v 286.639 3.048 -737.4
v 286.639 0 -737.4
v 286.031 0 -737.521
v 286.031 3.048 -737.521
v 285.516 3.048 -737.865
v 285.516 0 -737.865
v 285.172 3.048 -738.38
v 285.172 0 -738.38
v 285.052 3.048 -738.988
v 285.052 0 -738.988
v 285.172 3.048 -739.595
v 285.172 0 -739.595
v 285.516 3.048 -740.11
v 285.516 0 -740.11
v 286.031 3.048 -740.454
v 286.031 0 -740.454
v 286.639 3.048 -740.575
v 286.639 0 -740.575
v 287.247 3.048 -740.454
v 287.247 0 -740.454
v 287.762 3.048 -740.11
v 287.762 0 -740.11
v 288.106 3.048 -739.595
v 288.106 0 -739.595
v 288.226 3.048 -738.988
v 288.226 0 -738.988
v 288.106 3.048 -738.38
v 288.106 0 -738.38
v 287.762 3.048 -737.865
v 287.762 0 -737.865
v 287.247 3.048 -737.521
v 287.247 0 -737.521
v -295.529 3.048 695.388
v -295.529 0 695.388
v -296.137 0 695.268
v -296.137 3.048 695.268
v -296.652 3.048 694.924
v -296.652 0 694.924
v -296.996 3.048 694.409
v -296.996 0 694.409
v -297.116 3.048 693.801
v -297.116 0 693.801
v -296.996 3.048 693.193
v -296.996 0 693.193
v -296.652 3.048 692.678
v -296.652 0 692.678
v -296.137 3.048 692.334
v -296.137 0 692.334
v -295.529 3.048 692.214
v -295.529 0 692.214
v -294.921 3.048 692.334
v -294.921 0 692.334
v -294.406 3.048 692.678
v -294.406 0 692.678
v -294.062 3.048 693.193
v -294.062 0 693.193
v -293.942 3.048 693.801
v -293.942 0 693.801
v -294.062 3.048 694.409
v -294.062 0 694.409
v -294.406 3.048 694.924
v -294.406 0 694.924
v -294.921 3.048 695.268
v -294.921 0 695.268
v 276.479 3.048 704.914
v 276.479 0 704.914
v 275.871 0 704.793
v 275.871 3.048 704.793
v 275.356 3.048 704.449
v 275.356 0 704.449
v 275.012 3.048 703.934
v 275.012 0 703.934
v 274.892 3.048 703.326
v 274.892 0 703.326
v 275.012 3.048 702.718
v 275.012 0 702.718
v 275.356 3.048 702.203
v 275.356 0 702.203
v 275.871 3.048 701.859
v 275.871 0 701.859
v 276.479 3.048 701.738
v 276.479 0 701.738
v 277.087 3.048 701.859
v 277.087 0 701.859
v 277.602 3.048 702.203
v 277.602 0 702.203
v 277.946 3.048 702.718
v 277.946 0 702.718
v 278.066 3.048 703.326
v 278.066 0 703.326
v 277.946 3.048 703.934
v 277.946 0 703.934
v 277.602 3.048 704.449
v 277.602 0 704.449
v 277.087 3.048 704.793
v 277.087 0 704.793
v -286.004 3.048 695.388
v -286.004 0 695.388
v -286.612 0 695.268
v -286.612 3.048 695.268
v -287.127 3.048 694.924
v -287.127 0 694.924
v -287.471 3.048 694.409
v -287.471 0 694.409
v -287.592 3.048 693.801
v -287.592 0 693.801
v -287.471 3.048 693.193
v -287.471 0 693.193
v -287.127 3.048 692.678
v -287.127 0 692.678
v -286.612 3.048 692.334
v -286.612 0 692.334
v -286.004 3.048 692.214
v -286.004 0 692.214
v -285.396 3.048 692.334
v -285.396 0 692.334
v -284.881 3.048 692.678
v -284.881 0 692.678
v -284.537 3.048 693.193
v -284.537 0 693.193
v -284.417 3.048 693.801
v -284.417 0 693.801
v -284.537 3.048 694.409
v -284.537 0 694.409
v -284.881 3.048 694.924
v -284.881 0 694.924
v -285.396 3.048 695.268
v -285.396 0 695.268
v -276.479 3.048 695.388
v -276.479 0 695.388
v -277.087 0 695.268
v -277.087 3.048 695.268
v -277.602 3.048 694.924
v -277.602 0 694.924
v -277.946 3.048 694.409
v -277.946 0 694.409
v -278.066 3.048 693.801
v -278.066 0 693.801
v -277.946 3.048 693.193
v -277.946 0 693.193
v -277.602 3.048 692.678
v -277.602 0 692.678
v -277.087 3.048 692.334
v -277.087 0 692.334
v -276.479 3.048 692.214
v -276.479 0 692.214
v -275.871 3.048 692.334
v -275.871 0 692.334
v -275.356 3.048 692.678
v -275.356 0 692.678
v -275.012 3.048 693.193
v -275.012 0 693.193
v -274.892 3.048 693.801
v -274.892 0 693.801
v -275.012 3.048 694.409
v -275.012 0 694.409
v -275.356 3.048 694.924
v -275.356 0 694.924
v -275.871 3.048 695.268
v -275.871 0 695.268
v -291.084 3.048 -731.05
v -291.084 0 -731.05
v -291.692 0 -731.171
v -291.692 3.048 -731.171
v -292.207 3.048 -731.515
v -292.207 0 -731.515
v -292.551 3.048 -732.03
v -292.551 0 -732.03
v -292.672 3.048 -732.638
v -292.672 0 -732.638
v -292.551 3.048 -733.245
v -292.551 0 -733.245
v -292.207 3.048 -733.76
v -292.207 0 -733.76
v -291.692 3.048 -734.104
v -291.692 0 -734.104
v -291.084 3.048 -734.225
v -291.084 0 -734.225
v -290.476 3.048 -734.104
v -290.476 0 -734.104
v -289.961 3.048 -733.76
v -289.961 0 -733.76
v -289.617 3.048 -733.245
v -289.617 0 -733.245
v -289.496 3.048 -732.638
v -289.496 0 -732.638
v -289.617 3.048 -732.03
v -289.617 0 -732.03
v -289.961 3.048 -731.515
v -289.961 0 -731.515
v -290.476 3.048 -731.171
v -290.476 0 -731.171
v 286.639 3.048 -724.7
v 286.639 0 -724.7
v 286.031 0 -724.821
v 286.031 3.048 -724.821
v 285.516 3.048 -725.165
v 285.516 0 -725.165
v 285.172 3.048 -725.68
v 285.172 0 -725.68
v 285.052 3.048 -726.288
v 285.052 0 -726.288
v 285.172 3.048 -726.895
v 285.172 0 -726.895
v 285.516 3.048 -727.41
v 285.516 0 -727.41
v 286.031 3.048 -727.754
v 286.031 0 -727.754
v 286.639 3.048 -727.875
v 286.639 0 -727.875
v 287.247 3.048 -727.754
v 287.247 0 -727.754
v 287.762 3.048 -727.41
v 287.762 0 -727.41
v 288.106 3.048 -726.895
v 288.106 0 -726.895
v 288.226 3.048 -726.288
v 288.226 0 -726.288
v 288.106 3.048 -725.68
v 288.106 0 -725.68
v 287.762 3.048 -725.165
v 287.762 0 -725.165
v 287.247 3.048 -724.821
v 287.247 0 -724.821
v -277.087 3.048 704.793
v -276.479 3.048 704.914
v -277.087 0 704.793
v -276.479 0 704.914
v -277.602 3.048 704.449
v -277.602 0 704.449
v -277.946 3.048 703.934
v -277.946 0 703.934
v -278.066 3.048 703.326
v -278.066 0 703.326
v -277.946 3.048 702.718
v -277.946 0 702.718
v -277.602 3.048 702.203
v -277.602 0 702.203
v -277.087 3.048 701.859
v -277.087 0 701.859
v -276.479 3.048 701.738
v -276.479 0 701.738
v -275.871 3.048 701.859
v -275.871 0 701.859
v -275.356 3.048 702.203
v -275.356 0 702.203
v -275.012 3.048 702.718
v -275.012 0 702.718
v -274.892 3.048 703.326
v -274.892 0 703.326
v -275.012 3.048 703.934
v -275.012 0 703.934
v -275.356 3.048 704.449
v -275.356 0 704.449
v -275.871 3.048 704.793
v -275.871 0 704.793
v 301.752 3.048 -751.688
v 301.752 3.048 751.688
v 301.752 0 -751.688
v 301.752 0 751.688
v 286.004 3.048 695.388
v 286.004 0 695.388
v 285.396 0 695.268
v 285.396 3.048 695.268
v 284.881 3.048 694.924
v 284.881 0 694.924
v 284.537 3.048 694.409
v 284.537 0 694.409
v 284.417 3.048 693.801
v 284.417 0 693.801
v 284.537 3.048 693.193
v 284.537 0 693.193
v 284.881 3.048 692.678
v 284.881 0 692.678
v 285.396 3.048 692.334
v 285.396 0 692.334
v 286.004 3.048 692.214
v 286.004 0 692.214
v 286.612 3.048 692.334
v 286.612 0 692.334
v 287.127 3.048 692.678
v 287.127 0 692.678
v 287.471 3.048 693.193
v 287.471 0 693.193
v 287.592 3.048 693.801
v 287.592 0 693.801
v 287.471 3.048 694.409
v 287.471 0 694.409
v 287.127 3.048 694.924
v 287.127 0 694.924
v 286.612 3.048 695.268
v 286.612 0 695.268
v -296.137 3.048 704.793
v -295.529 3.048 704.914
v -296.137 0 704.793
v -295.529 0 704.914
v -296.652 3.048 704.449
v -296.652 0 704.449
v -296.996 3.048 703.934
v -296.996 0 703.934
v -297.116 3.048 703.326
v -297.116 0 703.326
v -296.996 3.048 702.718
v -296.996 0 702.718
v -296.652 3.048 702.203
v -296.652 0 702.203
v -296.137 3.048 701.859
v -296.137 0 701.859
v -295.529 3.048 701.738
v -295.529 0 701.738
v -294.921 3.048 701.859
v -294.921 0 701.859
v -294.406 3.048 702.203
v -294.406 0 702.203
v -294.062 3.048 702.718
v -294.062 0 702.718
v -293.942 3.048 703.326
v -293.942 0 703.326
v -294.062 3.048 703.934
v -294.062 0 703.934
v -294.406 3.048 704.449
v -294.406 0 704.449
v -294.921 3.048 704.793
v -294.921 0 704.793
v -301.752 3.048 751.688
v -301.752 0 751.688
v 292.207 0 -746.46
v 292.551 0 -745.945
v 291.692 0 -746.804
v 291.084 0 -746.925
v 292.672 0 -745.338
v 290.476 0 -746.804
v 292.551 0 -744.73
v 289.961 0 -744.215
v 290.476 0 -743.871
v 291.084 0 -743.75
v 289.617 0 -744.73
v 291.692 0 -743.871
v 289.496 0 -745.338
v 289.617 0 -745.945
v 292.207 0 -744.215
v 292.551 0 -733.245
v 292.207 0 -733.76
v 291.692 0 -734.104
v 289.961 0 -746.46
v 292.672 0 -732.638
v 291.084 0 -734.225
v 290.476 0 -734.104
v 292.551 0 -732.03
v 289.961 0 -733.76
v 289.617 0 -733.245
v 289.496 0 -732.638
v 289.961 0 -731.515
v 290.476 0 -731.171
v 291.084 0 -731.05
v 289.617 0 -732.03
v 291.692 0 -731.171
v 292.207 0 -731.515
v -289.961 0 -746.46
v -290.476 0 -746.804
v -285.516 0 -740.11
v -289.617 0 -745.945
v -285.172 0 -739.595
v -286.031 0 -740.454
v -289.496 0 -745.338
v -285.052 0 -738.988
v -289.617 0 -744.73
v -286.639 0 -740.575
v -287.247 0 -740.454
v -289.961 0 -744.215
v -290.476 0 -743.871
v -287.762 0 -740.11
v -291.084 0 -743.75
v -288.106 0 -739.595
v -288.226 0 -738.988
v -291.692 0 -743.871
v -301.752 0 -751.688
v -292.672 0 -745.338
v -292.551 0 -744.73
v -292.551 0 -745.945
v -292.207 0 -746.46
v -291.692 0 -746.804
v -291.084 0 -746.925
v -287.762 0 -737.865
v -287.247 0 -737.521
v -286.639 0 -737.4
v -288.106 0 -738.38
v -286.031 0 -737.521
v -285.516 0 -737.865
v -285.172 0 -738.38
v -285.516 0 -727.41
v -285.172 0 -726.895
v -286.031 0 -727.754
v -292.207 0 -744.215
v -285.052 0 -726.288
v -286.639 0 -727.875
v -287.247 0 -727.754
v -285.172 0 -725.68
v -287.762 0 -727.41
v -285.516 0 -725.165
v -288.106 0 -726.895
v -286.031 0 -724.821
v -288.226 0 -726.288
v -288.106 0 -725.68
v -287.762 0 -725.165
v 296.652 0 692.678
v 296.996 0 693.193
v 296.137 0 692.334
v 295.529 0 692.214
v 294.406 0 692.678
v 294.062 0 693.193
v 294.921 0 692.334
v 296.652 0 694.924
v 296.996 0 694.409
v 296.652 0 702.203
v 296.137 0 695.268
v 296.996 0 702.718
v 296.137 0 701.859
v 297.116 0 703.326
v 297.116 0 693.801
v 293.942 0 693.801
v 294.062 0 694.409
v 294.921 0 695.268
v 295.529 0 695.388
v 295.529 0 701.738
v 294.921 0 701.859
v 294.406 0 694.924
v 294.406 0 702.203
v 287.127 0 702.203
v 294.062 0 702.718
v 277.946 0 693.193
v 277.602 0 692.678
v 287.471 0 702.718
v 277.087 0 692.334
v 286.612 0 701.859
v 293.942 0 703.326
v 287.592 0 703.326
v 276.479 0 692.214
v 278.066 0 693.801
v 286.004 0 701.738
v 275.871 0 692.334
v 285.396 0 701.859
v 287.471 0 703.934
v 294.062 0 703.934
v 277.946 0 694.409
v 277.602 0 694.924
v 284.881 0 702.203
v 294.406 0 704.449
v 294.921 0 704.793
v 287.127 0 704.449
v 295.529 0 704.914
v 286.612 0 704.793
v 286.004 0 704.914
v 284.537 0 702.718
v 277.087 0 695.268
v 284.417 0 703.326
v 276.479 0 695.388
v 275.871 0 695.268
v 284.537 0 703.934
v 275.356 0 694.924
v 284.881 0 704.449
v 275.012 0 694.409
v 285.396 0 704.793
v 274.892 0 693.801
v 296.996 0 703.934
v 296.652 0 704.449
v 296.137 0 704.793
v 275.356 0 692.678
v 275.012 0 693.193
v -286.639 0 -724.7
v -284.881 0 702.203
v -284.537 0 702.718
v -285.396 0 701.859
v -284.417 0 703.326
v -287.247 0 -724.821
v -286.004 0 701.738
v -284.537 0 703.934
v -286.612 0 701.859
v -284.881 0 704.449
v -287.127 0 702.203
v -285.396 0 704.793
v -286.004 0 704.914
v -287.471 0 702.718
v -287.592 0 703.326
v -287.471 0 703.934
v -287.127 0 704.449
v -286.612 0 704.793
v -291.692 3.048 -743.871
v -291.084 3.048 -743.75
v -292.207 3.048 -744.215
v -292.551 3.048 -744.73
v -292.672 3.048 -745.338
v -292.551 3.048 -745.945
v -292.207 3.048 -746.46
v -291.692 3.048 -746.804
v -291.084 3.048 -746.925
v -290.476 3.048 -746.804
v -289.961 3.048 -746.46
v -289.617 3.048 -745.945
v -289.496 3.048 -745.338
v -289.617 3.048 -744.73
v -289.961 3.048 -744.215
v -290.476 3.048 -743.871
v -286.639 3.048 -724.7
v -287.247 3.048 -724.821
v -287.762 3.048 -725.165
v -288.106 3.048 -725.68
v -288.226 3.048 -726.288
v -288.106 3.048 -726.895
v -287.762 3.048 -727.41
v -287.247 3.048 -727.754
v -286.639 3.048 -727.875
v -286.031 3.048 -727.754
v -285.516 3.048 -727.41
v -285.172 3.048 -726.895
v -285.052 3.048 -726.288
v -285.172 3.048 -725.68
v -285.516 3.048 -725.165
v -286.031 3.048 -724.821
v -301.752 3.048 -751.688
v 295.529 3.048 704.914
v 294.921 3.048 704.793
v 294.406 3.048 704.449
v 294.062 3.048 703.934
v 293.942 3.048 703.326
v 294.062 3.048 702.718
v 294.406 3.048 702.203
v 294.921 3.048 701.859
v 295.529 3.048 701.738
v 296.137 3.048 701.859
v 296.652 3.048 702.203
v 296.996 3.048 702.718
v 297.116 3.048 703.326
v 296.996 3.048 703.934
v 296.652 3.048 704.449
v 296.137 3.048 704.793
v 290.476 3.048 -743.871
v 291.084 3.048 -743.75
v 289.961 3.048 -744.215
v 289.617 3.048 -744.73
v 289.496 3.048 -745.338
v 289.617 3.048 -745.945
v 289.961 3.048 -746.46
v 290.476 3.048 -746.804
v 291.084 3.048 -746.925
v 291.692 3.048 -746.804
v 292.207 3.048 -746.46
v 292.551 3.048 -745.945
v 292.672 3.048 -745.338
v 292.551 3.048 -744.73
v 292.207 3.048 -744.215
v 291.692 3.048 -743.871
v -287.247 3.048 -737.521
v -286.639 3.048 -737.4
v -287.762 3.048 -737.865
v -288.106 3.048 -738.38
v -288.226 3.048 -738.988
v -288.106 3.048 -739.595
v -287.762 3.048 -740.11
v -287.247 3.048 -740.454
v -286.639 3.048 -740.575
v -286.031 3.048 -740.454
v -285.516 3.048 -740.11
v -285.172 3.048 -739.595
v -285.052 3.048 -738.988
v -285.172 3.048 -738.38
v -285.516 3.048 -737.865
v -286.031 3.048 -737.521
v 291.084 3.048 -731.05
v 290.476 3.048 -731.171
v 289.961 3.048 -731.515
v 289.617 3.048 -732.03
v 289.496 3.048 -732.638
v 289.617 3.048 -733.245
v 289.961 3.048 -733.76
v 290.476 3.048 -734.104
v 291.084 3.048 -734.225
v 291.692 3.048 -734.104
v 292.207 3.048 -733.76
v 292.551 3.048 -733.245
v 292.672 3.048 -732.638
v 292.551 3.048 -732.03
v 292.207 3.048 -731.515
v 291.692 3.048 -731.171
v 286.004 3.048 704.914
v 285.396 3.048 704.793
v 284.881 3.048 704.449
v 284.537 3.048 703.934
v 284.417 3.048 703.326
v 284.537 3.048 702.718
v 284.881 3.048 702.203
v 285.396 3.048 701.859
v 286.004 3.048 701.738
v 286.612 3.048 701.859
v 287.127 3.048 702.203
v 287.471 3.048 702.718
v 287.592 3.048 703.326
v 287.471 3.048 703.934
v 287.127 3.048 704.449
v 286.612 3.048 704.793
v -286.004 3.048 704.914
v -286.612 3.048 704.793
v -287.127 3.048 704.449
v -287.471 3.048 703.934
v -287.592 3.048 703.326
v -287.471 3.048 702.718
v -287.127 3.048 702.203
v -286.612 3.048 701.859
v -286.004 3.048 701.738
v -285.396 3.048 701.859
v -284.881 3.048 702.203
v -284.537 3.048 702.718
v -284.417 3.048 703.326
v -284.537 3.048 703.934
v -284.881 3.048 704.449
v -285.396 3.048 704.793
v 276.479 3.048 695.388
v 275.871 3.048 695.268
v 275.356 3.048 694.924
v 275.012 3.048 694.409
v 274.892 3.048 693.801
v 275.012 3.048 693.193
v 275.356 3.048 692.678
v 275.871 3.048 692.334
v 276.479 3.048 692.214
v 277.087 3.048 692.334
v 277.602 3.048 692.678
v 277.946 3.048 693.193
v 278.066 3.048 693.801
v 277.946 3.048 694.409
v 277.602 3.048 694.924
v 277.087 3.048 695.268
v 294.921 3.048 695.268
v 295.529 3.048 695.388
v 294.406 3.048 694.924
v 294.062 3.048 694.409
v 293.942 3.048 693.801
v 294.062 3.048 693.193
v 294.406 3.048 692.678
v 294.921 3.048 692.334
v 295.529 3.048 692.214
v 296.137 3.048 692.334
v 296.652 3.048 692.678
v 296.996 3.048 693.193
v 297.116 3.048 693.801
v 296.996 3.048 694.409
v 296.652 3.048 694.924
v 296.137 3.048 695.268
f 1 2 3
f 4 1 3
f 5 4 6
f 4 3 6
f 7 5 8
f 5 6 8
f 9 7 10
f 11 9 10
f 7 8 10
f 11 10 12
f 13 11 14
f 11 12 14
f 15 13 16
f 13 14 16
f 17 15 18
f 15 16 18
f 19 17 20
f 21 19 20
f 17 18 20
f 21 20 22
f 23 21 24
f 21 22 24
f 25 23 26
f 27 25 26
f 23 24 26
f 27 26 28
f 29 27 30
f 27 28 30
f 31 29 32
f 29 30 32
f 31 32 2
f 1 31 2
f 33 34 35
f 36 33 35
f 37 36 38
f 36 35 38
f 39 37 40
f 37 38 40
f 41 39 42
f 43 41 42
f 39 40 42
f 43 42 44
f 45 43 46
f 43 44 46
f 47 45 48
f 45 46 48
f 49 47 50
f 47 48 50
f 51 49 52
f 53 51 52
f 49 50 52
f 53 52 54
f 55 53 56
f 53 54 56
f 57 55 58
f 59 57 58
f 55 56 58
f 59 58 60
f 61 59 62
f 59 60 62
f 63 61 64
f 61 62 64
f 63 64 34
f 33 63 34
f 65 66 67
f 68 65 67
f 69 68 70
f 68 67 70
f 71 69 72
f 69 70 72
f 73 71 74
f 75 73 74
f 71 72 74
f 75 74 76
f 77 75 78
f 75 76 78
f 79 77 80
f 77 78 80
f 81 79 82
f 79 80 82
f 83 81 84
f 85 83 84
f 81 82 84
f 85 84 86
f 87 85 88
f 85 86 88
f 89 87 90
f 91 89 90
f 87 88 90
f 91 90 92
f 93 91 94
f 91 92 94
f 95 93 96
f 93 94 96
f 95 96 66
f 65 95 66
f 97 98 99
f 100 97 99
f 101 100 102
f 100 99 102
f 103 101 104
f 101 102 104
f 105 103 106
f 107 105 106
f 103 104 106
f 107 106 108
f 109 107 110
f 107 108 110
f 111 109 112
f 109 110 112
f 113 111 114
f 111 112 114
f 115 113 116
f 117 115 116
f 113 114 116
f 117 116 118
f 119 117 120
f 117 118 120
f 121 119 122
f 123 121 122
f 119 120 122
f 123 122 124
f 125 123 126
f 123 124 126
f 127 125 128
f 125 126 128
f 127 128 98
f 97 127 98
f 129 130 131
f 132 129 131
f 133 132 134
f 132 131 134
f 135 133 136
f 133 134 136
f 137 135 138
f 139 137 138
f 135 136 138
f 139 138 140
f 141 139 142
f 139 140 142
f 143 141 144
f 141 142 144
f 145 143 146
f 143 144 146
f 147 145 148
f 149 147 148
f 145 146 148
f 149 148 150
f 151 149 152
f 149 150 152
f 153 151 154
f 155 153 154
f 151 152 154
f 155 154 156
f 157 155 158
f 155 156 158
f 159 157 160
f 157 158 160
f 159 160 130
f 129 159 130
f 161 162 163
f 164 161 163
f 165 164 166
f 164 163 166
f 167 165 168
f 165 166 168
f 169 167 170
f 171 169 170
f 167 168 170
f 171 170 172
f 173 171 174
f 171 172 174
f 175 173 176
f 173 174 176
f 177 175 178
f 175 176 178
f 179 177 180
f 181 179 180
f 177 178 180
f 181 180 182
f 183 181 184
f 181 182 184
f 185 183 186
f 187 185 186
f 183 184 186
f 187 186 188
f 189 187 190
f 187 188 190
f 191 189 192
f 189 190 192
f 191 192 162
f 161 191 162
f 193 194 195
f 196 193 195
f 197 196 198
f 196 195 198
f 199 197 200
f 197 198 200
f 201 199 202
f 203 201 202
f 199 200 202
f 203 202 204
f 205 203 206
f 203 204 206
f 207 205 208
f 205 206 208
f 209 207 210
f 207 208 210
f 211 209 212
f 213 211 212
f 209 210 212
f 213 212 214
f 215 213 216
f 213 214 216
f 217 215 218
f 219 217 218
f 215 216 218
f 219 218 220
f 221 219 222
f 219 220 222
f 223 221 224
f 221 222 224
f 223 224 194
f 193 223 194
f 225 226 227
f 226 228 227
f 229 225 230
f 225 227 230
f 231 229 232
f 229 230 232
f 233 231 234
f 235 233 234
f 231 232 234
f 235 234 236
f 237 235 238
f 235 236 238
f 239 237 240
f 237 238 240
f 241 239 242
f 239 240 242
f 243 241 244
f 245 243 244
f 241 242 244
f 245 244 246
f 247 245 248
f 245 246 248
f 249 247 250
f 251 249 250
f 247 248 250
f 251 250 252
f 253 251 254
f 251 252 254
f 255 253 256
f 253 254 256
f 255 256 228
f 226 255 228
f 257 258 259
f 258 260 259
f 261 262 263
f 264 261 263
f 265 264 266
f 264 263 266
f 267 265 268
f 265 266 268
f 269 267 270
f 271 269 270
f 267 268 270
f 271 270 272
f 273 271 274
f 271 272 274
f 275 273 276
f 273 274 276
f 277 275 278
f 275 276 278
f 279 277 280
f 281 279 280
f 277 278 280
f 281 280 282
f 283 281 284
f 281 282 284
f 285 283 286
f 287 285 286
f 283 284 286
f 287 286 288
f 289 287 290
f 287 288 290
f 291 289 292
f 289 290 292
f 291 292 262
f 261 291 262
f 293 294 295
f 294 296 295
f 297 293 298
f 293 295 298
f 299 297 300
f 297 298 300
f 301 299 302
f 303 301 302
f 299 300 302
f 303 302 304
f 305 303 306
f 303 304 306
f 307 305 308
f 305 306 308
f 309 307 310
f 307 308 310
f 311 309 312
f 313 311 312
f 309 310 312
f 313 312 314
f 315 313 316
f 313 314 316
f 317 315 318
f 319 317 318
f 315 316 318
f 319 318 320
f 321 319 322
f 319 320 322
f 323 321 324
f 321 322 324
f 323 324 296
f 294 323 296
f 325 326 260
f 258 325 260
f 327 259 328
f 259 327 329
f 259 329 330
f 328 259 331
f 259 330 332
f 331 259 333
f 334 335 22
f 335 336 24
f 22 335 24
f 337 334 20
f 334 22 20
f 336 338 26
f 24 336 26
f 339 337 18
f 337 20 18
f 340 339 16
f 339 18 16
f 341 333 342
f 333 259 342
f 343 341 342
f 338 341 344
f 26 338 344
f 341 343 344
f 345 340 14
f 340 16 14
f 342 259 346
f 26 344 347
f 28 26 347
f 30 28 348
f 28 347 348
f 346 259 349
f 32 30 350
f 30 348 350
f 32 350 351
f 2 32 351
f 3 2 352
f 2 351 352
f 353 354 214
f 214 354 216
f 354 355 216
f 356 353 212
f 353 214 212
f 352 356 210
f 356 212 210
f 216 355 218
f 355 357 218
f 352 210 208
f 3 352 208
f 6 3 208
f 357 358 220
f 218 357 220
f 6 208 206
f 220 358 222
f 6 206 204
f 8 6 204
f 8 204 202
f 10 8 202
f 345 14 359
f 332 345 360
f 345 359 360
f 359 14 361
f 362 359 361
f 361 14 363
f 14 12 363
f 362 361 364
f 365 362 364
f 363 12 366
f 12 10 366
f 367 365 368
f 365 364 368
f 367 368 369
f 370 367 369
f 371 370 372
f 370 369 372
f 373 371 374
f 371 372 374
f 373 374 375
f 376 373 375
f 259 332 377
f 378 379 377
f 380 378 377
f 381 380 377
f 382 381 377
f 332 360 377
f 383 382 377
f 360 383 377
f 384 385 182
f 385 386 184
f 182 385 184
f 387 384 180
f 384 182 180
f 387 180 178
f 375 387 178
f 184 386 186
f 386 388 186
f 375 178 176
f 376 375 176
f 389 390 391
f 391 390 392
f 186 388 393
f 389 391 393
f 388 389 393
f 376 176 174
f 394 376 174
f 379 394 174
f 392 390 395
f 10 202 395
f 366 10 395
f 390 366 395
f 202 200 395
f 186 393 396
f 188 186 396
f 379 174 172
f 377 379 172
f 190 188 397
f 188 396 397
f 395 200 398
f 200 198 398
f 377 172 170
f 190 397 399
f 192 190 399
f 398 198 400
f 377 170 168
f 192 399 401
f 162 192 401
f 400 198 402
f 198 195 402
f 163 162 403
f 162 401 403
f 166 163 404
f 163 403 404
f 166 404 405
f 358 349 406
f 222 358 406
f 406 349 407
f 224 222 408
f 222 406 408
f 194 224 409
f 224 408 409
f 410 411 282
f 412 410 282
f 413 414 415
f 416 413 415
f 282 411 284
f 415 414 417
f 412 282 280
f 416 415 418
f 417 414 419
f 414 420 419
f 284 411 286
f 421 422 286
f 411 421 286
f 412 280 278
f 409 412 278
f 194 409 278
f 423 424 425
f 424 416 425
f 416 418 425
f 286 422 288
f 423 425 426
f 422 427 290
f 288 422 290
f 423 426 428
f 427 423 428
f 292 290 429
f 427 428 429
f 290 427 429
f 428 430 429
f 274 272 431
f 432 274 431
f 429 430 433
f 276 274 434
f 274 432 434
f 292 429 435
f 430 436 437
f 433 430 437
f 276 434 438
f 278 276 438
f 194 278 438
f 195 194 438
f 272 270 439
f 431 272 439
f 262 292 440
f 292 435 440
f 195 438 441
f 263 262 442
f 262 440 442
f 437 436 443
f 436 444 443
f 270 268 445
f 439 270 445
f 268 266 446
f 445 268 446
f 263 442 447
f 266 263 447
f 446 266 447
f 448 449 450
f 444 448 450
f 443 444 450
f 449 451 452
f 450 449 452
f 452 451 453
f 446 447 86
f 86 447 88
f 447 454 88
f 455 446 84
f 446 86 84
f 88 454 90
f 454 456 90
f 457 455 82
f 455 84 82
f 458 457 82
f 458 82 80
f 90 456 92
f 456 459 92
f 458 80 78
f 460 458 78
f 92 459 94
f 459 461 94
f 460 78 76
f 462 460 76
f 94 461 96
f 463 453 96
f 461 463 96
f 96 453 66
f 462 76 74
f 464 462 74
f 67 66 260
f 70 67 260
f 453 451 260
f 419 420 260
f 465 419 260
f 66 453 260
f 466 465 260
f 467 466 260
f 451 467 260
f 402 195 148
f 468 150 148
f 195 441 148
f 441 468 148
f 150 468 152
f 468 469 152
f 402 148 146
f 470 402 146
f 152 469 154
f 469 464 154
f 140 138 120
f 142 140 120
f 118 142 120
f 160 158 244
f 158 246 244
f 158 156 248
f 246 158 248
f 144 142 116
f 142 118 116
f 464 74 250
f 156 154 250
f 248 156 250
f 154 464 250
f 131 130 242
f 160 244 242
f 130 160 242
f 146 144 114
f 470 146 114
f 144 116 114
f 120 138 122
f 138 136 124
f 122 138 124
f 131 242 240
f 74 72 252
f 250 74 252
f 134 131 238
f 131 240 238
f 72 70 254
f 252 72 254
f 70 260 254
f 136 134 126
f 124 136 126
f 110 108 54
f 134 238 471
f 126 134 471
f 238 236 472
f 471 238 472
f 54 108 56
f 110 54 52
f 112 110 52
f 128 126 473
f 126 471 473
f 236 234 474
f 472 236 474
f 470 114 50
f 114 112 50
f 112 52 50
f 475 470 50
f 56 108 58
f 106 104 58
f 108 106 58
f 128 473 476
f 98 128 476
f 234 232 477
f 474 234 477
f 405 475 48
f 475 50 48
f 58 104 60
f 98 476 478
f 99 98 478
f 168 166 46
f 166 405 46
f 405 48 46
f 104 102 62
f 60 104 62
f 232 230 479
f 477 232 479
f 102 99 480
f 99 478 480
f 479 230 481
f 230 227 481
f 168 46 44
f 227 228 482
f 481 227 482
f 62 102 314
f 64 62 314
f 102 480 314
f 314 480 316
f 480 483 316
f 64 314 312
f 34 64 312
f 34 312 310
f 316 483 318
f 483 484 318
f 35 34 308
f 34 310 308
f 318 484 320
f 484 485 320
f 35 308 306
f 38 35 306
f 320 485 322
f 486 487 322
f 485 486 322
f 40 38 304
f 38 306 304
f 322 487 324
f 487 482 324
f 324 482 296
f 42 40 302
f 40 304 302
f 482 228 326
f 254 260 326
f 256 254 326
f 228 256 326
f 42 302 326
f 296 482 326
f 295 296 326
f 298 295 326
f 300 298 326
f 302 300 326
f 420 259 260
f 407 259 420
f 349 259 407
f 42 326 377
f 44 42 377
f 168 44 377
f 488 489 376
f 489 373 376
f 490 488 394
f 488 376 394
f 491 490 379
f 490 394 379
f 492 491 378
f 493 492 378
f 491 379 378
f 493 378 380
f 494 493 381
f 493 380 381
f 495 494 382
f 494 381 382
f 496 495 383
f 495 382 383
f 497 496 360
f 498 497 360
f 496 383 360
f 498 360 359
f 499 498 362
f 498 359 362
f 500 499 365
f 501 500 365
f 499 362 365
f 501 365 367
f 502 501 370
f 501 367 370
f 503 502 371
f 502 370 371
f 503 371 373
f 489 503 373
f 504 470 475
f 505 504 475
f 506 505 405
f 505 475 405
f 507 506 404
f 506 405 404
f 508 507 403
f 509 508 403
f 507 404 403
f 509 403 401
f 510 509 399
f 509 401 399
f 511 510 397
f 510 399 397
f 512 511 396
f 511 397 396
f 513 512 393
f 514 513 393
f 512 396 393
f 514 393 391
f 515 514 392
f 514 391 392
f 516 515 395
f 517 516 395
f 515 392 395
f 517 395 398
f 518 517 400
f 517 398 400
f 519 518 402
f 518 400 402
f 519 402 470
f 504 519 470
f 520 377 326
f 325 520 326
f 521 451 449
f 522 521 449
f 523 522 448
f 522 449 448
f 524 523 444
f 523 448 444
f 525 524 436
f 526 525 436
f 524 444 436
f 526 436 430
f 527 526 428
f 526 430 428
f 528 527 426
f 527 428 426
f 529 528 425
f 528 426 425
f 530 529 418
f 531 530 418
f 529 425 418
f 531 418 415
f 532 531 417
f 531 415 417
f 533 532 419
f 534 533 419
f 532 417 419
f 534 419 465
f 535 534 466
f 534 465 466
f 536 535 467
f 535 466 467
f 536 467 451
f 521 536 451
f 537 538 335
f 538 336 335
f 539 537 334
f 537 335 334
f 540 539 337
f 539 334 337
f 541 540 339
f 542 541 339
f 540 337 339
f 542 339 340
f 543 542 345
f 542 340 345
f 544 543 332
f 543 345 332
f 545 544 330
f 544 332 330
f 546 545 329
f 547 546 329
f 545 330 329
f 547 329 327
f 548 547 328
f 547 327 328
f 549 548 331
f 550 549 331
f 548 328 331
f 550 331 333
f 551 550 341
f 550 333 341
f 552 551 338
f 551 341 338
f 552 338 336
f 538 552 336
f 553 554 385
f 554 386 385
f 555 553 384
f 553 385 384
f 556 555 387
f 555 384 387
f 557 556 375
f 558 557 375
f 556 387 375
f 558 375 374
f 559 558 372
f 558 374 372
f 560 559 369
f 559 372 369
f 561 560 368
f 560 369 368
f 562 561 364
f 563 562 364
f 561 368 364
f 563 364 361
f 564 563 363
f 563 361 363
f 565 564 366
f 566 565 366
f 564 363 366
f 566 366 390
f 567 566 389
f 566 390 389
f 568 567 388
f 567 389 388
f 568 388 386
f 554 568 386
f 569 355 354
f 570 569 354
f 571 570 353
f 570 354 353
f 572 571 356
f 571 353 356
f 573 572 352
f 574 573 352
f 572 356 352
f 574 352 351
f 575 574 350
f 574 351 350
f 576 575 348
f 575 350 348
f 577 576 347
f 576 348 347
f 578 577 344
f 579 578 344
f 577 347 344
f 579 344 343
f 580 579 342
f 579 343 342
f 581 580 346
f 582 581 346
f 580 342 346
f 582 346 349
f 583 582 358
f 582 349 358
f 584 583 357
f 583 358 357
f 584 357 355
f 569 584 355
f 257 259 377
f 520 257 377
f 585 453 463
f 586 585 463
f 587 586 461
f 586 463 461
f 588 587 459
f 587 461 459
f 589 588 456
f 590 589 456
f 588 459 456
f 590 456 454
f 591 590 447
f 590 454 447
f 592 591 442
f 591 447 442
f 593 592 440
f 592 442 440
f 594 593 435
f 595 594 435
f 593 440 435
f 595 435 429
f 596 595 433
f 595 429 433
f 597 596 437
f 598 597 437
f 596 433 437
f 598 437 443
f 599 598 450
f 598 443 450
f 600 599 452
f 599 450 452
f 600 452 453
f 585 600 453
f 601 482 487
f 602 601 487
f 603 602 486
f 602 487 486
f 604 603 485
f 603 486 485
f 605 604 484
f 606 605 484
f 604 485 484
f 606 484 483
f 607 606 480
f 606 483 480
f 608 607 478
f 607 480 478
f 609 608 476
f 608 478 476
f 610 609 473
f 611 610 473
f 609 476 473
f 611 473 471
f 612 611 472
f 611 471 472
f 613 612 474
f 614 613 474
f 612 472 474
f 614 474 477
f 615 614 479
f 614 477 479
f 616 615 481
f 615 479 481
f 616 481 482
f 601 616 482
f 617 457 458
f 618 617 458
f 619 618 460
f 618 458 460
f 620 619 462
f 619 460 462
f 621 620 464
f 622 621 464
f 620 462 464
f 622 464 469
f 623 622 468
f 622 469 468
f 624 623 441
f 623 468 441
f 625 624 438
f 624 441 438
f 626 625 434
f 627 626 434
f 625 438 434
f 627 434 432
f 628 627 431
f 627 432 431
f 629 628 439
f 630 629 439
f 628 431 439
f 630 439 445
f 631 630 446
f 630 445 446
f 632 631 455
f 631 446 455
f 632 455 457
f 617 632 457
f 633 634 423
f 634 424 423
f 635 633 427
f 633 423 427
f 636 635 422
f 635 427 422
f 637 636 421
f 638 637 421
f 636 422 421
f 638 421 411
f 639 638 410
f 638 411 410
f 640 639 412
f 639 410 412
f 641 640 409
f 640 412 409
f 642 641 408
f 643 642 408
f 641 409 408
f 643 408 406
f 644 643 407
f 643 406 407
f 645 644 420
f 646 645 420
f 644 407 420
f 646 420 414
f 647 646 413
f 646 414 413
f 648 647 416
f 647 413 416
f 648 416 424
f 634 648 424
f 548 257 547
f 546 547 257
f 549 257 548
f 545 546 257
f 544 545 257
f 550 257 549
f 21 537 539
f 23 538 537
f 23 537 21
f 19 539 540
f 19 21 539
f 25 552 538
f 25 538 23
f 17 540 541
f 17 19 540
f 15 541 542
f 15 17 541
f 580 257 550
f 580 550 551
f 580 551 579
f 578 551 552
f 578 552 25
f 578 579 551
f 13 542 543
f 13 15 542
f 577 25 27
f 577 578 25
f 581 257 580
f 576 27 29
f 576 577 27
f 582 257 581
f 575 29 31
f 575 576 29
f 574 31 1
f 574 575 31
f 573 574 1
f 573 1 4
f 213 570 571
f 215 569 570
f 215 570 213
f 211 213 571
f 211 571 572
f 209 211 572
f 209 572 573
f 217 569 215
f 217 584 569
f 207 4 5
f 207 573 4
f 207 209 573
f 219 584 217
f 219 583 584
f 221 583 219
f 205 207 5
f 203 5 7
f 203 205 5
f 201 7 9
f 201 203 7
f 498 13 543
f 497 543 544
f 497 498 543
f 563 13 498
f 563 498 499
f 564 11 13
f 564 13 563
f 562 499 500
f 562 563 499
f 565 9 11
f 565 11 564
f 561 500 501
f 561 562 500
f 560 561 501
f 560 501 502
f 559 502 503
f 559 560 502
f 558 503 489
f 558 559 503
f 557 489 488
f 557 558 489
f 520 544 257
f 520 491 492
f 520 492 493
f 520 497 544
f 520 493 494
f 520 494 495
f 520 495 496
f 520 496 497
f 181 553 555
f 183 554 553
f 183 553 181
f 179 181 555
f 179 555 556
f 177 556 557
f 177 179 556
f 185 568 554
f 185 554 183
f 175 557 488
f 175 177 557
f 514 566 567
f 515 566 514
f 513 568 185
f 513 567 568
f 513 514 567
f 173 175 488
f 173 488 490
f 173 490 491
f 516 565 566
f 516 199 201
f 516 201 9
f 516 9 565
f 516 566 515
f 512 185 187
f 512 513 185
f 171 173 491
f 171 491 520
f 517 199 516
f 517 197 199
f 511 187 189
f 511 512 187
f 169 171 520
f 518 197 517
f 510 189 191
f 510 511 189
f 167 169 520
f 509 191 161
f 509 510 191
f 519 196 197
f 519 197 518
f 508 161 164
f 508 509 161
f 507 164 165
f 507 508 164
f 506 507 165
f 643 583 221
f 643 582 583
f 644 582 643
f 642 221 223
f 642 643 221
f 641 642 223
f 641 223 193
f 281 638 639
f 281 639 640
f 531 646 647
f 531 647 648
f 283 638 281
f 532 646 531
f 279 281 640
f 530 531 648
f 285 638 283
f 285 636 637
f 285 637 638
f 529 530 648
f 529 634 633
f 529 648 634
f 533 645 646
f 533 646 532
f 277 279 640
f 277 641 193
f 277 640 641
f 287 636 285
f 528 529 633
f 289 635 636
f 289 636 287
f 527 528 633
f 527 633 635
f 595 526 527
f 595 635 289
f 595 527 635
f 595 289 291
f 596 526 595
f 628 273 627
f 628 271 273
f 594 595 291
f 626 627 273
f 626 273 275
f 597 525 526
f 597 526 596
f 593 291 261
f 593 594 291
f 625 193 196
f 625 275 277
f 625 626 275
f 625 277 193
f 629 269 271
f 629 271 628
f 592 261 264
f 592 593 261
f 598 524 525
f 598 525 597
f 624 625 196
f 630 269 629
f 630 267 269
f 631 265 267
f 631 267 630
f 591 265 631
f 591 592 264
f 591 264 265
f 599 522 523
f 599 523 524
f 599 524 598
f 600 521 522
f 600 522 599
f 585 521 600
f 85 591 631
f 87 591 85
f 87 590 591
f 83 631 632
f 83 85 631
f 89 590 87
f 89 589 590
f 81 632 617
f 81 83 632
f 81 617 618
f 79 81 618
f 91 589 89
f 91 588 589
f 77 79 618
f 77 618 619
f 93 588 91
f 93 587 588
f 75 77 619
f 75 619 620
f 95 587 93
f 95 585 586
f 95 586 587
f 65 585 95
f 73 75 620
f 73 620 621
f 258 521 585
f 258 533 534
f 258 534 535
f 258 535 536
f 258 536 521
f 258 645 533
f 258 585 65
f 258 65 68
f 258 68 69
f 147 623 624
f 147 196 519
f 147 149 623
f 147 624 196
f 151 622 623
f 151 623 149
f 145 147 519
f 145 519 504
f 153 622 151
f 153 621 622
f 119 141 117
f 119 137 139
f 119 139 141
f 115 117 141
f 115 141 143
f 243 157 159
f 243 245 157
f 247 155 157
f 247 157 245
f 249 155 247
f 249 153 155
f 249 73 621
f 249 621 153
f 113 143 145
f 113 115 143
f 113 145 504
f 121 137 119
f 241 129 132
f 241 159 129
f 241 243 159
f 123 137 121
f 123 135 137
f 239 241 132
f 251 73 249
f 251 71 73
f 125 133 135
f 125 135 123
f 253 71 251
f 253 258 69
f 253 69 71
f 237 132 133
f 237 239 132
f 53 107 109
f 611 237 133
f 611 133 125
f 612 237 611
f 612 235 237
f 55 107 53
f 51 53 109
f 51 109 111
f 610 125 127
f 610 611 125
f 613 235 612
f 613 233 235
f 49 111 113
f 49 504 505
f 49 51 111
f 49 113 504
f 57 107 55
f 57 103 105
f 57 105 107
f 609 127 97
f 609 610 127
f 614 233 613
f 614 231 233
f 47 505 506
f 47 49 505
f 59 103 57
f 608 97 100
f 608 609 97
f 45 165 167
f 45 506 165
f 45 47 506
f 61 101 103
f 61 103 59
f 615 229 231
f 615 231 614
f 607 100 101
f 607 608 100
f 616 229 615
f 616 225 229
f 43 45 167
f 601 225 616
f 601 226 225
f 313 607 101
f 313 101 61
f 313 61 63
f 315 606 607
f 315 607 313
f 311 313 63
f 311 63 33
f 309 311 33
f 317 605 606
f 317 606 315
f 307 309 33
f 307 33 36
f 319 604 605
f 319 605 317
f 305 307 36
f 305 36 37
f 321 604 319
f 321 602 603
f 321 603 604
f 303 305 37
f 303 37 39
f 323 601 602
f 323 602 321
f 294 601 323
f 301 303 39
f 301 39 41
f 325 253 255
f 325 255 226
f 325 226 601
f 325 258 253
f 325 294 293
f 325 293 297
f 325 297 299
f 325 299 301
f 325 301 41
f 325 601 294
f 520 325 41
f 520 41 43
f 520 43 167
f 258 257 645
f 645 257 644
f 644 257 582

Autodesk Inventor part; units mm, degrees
ref_plane "YZ Plane" through (0, 0, 0) normal (1, 0, 0) x (0, 1, 0)
ref_plane "XZ Plane" through (0, 0, 0) normal (0, 1, 0) x (-1, 0, 0)
ref_plane "XY Plane" through (0, 0, 0) normal (0, 0, 1) x (1, 0, 0)
sketch "Sketch2" plane through (0, 0, 0) normal (0, 1, 0) x (-1, 0, 0)
  line L0 (-301.752, -751.6876) -> (301.752, -751.6876)
  line L1 (301.752, -751.6876) -> (301.752, 751.6876)
  line L2 (301.752, 751.6876) -> (-301.752, 751.6876)
  line L3 (-301.752, 751.6876) -> (-301.752, -751.6876)
  point P0 (0, 0)
  dimension "d0" = 301.752
  dimension "d1" = 301.752
  dimension "d2" = 751.6876
  dimension "d3" = 751.6876
extrude "Plate1" add sketch "Sketch2" along normal blind 3.048
sketch "Sketch3" plane through (0, 3.048, 0) normal (0, 1, 0) x (1, 0, 0)
  line L0 (301.752, 751.6876) -> (301.752, -751.6876) projected
  line L1 (-301.752, -751.6876) -> (-301.752, 751.6876) projected
  line L2 (301.752, -751.6876) -> (-301.752, -751.6876) projected
  point P0 (0, 0)
  point P1 (-295.529, -693.801)
  point P2 (276.479, -693.801)
  dimension "d5" = 6.223
  dimension "d6" = 25.273
  dimension "d22" = 57.8866
  dimension "d23" = 57.8866
hole "Hole1" at (-295.529, 3.048, 693.801) at (276.479, 3.048, 693.801) direction (0, -1, 0) diameter 3.175 end through all
sketch "Sketch4" plane through (0, 3.048, 0) normal (0, 1, 0) x (1, 0, 0)
  circle A0 centre (-295.529, -693.801) radius 1.5875 projected
  line L0 (301.752, -751.6876) -> (-301.752, -751.6876) projected
  line L1 (-295.529, -693.801) -> (-270.8654, -693.801)
  point P0 (0, 0)
sketch "Sketch5" plane through (0, 3.048, 0) normal (0, 1, 0) x (1, 0, 0)
  circle A0 centre (-295.529, -693.801) radius 1.5875 projected
  line L0 (301.752, -751.6876) -> (-301.752, -751.6876) projected
  line L1 (-295.529, -693.801) -> (-295.529, -711.9838)
  line L2 (301.752, 751.6876) -> (301.752, -751.6876) projected
  point P0 (0, 0)
pattern_linear "Rectangular Pattern1" count 3 spacing 9.525 along (1, 0, 0) count 2 spacing 9.525 along (0, 0, 1) of "Hole1"
sketch "Sketch6" plane through (0, 3.048, 0) normal (0, 1, 0) x (1, 0, 0)
  line L0 (301.752, 751.6876) -> (301.752, -751.6876) projected
  line L1 (-301.752, 751.6876) -> (301.752, 751.6876) projected
  line L2 (-301.752, -751.6876) -> (-301.752, 751.6876) projected
  point P0 (0, 0)
  point P1 (291.084, 745.3376)
  point P2 (286.639, 738.9876)
  point P3 (291.084, 732.6376)
  point P4 (286.639, 726.2876)
  point P5 (-291.084, 745.3376)
  point P6 (-286.639, 738.9876)
  point P7 (-291.084, 732.6376)
  point P8 (-286.639, 726.2876)
  dimension "d24" = 10.668
  dimension "d25" = 4.445
  dimension "d26" = 6.35
  dimension "d27" = 6.35
  dimension "d28" = 6.35
  dimension "d29" = 6.35
  dimension "d30" = 10.668
  dimension "d31" = 4.445
hole "Hole2" at (291.084, 3.048, -745.3376) at (286.639, 3.048, -738.9876) at (291.084, 3.048, -732.6376) at (286.639, 3.048, -726.2876) at (-291.084, 3.048, -745.3376) at (-286.639, 3.048, -738.9876) at (-291.084, 3.048, -732.6376) at (-286.639, 3.048, -726.2876) direction (0, -1, 0) diameter 3.175 end through all
equation "\"d23\" = d22"
equation "\"d14\" = Thickness"
equation "\"d37\" = Thickness"
equation "\"d1\" = d0"
equation "\"d3\" = d2"
equation "\"BendRadius\" = Thickness"
equation "\"BendReliefWidth\" = Thickness"
equation "\"BendReliefDepth\" = 0.5 * Thickness"
equation "\"CornerReliefSize\" = 4 * Thickness"
equation "\"MinimumRemnant\" = 2 * Thickness"
equation "\"TransitionRadius\" = BendRadius"
equation "\"JacobiRadiusSize\" = BendRadius"
equation "\"GapSize\" = Thickness"
equation "\"d4\" = BendRadius"
equation "\"Thickness\" = 3.048"
properties part number "Base Top"
